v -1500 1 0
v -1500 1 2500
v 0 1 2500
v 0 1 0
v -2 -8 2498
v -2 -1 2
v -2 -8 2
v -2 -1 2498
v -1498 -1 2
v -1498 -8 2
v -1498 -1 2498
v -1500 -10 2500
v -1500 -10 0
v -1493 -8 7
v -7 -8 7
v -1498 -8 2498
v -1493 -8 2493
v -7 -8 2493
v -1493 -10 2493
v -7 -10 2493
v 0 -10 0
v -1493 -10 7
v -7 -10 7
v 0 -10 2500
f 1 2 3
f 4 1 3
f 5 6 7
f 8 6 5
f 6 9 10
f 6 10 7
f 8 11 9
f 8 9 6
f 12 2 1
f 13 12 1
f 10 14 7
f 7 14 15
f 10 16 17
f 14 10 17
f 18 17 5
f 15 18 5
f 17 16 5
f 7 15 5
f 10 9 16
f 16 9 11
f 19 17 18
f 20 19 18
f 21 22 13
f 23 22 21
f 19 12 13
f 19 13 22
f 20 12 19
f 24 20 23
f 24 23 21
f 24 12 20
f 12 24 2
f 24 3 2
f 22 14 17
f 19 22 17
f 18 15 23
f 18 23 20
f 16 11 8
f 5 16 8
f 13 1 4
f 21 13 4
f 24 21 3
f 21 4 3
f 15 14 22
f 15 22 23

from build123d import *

# Parameters (mm, degrees)
F0_W     = 1500
F0_H     = 2500
F1_DEPTH = 1
F2_W     = 2
F2_H     = 2
F2_W_2   = 1496
F2_H_2   = 2496
F3_DEPTH = 7
F4_W     = 7
F4_H     = 7
F4_W_2   = 1486
F4_H_2   = 2486
F5_DEPTH = 2


with BuildPart() as f1:
    # F0 (on Front) → F1 (new body, symmetric)
    with BuildSketch(Plane.XZ):
        with Locations((-750, 1250)):
            Rectangle(F0_W, F0_H)
    extrude(amount=F1_DEPTH, both=True)

    # F2 (on face) → F3 (join)
    with BuildSketch(Plane.XZ.offset(1)):
        with Locations((-1499, 2499)):
            Rectangle(F2_W, F2_H)
        with Locations((-750, 2499)):
            Rectangle(F2_W_2, F2_H)
        with Locations((-1499, 1250)):
            Rectangle(F2_W, F2_H_2)
        with Locations((-1, 2499)):
            Rectangle(F2_W, F2_H)
        with Locations((-1499, 1)):
            Rectangle(F2_W, F2_H)
        with Locations((-750, 1)):
            Rectangle(F2_W_2, F2_H)
        with Locations((-1, 1250)):
            Rectangle(F2_W, F2_H_2)
        with Locations((-1, 1)):
            Rectangle(F2_W, F2_H)
    extrude(amount=F3_DEPTH)

    # F4 (on face) → F5 (join)
    with BuildSketch(Plane.XZ.offset(8)):
        with Locations((-1496.5, 2496.5)):
            Rectangle(F4_W, F4_H)
        with Locations((-750, 2496.5)):
            Rectangle(F4_W_2, F4_H)
        with Locations((-1496.5, 1250)):
            Rectangle(F4_W, F4_H_2)
        with Locations((-3.5, 2496.5)):
            Rectangle(F4_W, F4_H)
        with Locations((-1496.5, 3.5)):
            Rectangle(F4_W, F4_H)
        with Locations((-750, 3.5)):
            Rectangle(F4_W_2, F4_H)
        with Locations((-3.5, 1250)):
            Rectangle(F4_W, F4_H_2)
        with Locations((-3.5, 3.5)):
            Rectangle(F4_W, F4_H)
    extrude(amount=F5_DEPTH)


solid = f1.part
